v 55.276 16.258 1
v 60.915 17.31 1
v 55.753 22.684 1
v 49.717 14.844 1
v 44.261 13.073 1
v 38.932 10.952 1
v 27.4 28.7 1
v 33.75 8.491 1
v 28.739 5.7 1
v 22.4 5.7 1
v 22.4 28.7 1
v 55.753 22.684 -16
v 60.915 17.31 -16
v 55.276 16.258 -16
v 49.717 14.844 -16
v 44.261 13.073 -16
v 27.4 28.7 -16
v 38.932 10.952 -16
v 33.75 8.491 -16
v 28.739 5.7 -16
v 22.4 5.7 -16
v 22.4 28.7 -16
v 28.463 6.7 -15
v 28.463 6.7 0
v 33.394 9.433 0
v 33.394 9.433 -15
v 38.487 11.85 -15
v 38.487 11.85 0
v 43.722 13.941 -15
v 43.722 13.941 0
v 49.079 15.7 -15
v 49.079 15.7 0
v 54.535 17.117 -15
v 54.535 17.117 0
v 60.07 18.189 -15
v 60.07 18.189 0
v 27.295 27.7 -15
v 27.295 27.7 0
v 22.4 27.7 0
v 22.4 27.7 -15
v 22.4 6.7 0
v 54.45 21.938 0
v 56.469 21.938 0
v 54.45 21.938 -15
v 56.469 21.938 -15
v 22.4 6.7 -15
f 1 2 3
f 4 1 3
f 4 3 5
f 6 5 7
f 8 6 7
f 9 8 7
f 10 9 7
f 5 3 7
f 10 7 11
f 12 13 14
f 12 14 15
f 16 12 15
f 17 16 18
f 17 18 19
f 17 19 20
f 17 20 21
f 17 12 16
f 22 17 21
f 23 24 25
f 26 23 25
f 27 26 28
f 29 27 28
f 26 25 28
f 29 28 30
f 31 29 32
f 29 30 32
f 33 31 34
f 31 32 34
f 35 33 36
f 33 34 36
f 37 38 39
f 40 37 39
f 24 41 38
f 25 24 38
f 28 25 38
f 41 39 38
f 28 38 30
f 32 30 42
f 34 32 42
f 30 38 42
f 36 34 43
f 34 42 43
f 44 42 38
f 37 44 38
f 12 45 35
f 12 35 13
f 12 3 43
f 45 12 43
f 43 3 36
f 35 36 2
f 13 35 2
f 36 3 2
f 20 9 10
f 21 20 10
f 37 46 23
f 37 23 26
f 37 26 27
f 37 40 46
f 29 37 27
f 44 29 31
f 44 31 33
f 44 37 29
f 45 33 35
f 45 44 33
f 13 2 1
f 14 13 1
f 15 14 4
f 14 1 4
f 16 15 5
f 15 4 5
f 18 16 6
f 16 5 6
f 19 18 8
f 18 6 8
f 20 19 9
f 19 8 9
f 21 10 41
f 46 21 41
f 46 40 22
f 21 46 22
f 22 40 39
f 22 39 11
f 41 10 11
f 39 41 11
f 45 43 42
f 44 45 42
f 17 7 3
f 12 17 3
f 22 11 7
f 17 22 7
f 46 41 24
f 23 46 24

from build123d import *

# Parameters (mm, degrees)
BOSS_EXTRUDE3_START = 1
BOSS_EXTRUDE3_DEPTH = 17
CUT_EXTRUDE1_START  = -1
CUT_EXTRUDE1_DEPTH  = 15


with BuildPart() as part:
    # Sketch1 → Boss-Extrude3 (new body)
    with BuildSketch(Plane.XY.offset(BOSS_EXTRUDE3_START)):
        with BuildLine():
            Line((22.4, 5.7), (22.4, 28.7))
            Line((22.4, 28.7), (27.4, 28.7))
            Line((27.4, 28.7), (55.753018587, 22.683636365))
            Line((55.753018587, 22.683636365), (60.914628912, 17.309586353))
            ThreePointArc((60.914628912, 17.309586353), (44.261162639, 13.072852444), (28.739278089, 5.7))
            Line((28.739278089, 5.7), (22.4, 5.7))
        make_face()
    extrude(amount=-BOSS_EXTRUDE3_DEPTH)

    # Sketch2 → Cut-Extrude1 (cut)
    with BuildSketch(Plane.XY.offset(1).offset(CUT_EXTRUDE1_START)):
        with BuildLine():
            Line((22.4, 6.7), (28.46302932, 6.7))
            ThreePointArc((28.46302932, 6.7), (43.722391124, 13.941290059), (60.06988402, 18.189098949))
            Line((60.06988402, 18.189098949), (56.469277883, 21.937897528))
            Line((56.469277883, 21.937897528), (54.449845351, 21.937897528))
            Line((54.449845351, 21.937897528), (27.295070739, 27.7))
            Line((27.295070739, 27.7), (22.4, 27.7))
            Line((22.4, 27.7), (22.4, 6.7))
        make_face()
    extrude(amount=-CUT_EXTRUDE1_DEPTH, mode=Mode.SUBTRACT)


solid = part.part
